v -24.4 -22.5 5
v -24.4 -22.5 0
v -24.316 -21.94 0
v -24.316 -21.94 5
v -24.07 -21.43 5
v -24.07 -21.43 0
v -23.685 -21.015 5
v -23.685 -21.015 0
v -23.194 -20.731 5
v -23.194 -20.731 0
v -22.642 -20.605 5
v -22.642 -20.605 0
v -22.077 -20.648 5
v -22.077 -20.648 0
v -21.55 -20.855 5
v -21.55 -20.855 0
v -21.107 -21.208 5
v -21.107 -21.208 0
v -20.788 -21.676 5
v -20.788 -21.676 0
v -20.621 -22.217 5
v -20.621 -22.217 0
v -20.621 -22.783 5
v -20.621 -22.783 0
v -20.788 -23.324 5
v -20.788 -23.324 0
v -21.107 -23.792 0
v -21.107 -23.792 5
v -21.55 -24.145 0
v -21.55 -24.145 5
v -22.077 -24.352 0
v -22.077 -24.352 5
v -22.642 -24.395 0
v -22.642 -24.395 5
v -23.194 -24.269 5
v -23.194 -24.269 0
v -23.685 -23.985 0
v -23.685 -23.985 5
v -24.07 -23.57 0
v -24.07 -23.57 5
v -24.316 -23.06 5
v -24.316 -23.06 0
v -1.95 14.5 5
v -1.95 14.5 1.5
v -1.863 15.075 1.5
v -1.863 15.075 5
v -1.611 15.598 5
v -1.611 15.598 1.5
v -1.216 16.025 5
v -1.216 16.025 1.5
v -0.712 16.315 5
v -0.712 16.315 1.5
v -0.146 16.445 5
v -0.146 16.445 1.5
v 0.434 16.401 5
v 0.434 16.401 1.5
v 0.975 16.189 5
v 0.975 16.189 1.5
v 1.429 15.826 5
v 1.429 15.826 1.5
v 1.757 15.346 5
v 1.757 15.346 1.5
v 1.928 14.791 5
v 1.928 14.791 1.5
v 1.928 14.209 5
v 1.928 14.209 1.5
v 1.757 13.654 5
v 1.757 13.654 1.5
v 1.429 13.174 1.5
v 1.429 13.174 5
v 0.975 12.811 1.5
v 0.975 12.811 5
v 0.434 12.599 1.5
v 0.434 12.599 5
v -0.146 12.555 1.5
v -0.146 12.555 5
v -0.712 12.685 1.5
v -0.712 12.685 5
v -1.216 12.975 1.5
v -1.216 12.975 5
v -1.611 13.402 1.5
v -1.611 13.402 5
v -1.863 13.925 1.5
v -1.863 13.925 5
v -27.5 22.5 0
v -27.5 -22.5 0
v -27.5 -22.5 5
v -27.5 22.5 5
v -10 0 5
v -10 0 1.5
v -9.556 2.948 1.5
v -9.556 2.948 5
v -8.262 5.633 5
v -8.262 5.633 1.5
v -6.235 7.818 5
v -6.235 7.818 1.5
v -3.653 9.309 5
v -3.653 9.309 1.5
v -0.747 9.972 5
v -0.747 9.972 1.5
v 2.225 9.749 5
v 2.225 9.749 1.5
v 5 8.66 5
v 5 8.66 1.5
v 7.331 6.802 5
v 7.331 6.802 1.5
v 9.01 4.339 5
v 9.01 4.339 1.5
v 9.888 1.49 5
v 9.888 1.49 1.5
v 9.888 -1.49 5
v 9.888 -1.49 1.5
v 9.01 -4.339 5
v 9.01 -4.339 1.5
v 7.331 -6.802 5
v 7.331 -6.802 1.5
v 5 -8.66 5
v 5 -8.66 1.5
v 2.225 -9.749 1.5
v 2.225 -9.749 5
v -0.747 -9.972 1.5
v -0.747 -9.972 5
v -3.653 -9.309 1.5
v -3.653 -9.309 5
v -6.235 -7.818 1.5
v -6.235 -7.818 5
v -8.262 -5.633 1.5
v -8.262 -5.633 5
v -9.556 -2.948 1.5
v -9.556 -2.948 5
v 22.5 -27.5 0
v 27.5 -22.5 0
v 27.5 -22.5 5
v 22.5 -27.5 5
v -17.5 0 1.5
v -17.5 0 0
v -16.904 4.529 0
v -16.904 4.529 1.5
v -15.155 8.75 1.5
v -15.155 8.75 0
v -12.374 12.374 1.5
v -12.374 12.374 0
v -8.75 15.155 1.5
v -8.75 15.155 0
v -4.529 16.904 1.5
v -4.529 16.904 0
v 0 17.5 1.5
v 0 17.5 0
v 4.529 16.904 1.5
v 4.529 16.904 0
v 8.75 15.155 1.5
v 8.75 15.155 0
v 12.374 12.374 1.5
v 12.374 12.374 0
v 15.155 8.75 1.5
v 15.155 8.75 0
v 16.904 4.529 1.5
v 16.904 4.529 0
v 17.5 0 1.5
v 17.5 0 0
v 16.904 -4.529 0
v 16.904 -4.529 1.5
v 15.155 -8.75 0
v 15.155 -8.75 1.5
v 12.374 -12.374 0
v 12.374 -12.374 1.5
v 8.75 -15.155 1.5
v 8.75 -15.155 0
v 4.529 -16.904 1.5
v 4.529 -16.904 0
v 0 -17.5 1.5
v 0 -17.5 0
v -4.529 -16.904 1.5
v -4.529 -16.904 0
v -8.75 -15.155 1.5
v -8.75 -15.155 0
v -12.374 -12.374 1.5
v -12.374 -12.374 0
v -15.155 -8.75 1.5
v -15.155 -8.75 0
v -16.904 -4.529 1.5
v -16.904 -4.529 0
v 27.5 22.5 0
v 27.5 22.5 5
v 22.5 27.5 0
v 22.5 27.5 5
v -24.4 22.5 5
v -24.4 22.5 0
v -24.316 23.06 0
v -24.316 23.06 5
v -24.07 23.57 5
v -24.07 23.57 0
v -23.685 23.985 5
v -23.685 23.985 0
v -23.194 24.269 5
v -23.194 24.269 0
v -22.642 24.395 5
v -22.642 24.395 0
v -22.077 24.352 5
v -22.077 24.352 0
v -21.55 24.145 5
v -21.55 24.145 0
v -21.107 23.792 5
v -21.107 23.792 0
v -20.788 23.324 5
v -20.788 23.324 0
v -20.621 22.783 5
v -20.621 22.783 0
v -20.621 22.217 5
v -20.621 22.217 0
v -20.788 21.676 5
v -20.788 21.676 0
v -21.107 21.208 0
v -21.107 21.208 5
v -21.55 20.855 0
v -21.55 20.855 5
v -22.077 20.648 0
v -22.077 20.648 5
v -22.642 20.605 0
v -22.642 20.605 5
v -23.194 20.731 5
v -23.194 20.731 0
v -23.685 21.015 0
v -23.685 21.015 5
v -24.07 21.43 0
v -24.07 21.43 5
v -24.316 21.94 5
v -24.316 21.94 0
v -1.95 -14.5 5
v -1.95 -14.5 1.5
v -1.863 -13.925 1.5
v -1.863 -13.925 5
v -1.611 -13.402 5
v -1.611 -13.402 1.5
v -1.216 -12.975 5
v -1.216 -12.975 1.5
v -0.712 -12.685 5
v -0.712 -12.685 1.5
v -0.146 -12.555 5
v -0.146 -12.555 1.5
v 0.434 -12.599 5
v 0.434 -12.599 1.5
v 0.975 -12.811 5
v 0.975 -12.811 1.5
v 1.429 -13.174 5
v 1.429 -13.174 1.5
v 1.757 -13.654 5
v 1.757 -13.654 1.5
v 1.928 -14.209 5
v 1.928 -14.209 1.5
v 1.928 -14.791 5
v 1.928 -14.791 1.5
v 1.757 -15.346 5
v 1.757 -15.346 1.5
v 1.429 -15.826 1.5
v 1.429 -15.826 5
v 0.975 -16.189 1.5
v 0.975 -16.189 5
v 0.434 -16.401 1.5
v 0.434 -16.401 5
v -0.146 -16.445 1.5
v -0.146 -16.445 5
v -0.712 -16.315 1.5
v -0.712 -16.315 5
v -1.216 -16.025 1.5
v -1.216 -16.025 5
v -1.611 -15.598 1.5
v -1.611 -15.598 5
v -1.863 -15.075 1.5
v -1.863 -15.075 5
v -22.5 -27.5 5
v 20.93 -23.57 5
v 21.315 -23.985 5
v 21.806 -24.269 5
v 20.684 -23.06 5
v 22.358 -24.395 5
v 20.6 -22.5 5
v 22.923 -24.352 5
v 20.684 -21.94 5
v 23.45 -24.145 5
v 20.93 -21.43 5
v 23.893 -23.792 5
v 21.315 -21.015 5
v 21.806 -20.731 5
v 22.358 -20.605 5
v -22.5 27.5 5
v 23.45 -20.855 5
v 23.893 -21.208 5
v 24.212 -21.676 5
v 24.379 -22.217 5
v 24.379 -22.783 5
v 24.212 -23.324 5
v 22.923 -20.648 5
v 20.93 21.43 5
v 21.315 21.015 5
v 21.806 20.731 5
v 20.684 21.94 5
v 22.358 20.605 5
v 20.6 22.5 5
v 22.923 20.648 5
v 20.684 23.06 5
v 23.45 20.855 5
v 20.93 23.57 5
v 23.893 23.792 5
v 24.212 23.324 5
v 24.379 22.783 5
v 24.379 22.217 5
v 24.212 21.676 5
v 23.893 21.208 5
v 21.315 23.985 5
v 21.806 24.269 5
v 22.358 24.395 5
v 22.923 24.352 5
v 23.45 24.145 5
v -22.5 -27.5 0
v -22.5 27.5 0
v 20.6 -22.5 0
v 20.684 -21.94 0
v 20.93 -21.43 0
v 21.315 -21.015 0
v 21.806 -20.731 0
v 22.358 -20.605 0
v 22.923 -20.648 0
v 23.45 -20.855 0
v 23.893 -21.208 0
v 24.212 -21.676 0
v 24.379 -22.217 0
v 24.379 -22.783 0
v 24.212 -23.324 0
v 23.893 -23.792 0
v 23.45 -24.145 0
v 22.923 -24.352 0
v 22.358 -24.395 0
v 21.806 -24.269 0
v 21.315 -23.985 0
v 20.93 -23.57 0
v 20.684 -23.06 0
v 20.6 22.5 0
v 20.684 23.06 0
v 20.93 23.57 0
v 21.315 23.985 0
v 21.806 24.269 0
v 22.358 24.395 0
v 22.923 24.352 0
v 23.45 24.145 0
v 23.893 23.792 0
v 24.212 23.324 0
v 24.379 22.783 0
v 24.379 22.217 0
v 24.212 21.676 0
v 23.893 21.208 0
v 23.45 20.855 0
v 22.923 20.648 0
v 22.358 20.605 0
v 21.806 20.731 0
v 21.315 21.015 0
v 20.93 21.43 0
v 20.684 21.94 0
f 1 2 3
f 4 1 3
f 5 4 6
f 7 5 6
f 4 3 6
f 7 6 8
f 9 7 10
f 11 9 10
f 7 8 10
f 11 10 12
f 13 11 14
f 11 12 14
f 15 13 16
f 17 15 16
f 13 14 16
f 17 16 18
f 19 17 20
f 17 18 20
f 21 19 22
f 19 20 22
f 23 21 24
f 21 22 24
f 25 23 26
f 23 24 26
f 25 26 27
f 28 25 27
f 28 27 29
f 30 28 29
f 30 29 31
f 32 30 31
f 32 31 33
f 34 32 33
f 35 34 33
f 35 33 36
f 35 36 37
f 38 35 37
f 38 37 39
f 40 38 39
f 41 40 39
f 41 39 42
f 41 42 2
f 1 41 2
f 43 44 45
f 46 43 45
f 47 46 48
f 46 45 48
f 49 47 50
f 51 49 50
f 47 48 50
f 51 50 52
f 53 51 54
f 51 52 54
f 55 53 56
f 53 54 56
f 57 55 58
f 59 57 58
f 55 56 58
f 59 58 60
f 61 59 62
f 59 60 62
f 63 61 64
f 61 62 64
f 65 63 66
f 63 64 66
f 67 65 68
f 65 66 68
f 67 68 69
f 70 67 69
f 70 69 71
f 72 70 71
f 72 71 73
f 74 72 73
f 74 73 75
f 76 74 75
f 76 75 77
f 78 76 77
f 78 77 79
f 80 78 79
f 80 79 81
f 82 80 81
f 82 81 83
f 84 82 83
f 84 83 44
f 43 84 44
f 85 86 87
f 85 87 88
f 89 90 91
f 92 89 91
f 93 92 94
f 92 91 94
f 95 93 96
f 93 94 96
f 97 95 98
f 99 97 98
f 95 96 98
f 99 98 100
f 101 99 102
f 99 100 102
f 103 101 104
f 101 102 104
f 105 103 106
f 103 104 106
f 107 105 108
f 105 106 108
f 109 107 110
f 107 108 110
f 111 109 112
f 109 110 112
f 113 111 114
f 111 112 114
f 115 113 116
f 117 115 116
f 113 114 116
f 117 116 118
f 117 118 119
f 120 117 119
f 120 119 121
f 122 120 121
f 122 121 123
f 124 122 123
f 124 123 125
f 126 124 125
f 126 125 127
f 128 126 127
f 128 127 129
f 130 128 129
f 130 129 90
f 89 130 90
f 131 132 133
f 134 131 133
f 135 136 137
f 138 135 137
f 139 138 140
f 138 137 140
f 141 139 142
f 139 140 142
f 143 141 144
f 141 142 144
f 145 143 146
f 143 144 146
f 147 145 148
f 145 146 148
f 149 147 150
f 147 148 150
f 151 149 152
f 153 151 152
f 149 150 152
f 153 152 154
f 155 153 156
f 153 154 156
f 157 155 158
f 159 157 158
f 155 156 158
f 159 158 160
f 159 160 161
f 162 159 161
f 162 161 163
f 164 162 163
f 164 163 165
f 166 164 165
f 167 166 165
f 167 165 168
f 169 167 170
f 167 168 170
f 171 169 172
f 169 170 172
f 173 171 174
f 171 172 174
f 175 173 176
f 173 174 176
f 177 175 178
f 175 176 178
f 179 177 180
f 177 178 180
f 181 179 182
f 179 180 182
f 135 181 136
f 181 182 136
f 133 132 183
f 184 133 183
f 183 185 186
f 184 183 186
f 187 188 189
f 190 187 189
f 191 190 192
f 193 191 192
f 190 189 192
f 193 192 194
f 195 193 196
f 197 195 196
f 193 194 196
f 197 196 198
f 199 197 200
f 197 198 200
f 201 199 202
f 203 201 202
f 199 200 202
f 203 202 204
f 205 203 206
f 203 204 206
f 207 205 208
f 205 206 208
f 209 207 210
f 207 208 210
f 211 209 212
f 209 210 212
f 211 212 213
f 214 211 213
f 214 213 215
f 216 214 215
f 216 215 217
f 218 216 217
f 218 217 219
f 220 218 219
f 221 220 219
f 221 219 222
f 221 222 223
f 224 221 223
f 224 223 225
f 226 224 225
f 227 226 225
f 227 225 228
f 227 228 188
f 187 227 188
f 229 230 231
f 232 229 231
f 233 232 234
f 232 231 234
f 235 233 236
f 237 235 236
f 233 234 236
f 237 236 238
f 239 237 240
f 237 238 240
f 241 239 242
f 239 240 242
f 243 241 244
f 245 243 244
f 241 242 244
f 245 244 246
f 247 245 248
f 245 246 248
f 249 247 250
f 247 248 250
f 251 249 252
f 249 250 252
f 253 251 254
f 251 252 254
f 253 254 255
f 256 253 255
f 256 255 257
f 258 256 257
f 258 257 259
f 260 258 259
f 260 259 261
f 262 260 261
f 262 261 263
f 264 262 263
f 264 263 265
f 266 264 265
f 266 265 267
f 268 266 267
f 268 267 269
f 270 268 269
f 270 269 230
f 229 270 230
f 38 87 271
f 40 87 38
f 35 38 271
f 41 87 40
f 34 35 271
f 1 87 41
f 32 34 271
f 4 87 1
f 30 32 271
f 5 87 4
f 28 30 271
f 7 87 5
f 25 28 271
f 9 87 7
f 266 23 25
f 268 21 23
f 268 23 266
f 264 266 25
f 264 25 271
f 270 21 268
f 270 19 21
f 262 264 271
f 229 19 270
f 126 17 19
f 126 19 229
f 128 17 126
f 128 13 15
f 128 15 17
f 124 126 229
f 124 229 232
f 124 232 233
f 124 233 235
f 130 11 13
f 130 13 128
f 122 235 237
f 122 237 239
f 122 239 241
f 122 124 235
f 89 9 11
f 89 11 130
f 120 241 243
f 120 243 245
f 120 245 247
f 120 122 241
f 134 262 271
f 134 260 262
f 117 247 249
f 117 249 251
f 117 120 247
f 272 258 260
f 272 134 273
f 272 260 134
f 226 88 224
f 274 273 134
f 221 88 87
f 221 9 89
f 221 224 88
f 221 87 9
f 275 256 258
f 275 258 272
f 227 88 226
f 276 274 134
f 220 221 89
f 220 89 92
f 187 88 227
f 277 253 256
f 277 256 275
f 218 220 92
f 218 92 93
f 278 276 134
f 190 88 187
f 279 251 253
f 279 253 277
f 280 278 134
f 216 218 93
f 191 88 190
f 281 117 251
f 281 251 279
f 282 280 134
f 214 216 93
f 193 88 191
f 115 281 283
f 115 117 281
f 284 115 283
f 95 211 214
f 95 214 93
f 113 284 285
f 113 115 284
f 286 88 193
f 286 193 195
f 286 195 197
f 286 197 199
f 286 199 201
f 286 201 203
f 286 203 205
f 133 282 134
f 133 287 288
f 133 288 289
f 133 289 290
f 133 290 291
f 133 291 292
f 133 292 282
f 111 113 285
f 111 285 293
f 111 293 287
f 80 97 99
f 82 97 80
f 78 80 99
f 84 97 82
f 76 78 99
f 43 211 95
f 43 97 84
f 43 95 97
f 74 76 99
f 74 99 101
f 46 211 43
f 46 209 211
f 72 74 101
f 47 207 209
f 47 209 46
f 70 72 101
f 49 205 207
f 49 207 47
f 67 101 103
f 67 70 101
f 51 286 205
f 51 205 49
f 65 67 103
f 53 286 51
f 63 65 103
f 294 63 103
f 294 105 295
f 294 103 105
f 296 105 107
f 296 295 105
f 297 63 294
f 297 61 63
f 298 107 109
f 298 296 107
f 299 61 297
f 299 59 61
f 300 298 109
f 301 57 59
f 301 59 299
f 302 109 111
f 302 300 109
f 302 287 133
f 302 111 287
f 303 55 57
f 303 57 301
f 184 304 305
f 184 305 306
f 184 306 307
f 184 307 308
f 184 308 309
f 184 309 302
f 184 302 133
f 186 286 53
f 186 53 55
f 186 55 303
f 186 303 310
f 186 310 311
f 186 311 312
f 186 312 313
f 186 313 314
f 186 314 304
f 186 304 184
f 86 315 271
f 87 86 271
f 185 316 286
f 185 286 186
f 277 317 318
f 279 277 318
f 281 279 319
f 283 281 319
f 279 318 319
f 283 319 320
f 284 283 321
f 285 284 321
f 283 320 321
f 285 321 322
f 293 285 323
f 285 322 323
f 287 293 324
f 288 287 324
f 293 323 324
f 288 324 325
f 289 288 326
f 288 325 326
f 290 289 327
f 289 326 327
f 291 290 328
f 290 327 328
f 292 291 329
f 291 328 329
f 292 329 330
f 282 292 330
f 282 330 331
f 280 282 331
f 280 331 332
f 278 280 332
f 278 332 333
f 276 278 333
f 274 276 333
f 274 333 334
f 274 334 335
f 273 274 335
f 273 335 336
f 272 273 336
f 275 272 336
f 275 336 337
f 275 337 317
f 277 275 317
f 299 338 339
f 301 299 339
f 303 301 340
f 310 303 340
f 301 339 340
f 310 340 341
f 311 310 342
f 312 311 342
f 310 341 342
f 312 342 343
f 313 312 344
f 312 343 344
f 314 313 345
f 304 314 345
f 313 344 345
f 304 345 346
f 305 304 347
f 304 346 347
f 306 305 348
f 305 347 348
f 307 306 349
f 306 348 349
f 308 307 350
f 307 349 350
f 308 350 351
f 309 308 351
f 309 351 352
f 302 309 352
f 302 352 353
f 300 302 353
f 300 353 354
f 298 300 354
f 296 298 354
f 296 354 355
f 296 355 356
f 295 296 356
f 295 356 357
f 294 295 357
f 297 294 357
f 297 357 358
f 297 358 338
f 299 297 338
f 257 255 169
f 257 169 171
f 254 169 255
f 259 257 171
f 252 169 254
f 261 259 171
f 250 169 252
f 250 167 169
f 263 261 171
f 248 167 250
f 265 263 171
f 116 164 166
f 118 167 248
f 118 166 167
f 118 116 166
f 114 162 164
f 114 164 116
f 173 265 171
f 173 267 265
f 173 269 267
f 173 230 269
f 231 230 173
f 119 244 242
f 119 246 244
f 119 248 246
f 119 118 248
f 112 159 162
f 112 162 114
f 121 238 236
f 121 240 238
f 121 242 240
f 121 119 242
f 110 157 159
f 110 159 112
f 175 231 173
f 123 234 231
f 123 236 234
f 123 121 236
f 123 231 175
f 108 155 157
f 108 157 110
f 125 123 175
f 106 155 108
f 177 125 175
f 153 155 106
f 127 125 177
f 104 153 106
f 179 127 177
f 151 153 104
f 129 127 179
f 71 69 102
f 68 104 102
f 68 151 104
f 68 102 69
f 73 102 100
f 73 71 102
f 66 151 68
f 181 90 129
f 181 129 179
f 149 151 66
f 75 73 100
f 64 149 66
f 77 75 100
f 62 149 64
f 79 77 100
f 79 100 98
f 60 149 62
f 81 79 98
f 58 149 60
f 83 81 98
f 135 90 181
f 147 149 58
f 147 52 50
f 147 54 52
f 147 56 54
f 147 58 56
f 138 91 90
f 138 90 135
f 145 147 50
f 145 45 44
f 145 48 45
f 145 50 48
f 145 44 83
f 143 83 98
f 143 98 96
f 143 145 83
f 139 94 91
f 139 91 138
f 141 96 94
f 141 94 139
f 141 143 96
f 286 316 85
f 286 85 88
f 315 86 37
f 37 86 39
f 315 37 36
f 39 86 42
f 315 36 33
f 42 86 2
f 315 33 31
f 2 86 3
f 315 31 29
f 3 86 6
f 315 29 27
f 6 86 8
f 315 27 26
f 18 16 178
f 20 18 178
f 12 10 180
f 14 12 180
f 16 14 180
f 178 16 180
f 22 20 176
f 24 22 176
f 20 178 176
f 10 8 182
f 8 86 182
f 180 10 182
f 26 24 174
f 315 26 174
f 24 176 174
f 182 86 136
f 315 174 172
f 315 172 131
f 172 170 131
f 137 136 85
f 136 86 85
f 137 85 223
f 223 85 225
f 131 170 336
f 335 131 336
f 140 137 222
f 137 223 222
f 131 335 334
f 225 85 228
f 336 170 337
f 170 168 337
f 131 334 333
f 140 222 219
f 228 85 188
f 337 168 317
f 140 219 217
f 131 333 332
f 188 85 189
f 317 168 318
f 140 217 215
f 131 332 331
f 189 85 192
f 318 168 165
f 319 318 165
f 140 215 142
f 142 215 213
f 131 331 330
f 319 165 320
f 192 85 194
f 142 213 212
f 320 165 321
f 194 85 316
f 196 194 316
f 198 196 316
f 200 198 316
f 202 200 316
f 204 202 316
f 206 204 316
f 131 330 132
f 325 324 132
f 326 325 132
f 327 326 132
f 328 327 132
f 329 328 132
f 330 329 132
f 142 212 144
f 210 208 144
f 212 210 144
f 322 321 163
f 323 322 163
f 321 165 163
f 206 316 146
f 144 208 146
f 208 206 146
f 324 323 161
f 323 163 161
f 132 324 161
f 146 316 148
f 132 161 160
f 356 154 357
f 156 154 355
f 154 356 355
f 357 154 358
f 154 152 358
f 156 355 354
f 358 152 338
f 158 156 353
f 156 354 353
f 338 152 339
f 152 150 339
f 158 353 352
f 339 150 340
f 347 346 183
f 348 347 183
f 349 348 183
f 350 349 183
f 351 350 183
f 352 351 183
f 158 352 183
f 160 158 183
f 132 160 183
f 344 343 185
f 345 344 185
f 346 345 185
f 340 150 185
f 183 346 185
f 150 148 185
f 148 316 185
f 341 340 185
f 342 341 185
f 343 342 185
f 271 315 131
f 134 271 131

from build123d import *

# Parameters (mm, degrees)
SKETCH1_W           = 55
SKETCH1_H           = 55
BOSS_EXTRUDE1_DEPTH = 5
CHAMFER1_SIZE       = 5
SKETCH2_R           = 1.95
SKETCH2_R_2         = 1.9
SKETCH2_R_3         = 10
CUT_EXTRUDE1_DEPTH  = 10
SKETCH3_R           = 17.5
CUT_EXTRUDE2_DEPTH  = 1.5


with BuildPart() as part:
    # Sketch1 → Boss-Extrude1 (new body)
    with BuildSketch(Plane.XY):
        Rectangle(SKETCH1_W, SKETCH1_H)
    extrude(amount=BOSS_EXTRUDE1_DEPTH)

    # Chamfer1
    chamfer1_edges = [part.edges().sort_by_distance(p)[0] for p in [
        (-27.5, -27.5, 2.5),
        (27.5, -27.5, 2.5),
        (27.5, 27.5, 2.5),
        (-27.5, 27.5, 2.5),
    ]]
    chamfer(chamfer1_edges, length=CHAMFER1_SIZE)

    # Sketch2 → Cut-Extrude1 (cut)
    with BuildSketch(Plane(origin=(0, 0, 0), x_dir=(-1, 0, 0), z_dir=(0, 0, -1))):
        with Locations((0, 14.5)):
            Circle(SKETCH2_R)
        with Locations((-22.5, 22.5)):
            Circle(SKETCH2_R_2)
        with Locations((22.5, 22.5)):
            Circle(SKETCH2_R_2)
        with Locations((22.5, -22.5)):
            Circle(SKETCH2_R_2)
        with Locations((-22.5, -22.5)):
            Circle(SKETCH2_R_2)
        Circle(SKETCH2_R_3)
        with Locations((0, -14.5)):
            Circle(SKETCH2_R)
    extrude(amount=-CUT_EXTRUDE1_DEPTH, mode=Mode.SUBTRACT)

    # Sketch3 → Cut-Extrude2 (cut)
    with BuildSketch(Plane(origin=(0, 0, 0), x_dir=(-1, 0, 0), z_dir=(0, 0, -1))):
        Circle(SKETCH3_R)
    extrude(amount=-CUT_EXTRUDE2_DEPTH, mode=Mode.SUBTRACT)


solid = part.part
